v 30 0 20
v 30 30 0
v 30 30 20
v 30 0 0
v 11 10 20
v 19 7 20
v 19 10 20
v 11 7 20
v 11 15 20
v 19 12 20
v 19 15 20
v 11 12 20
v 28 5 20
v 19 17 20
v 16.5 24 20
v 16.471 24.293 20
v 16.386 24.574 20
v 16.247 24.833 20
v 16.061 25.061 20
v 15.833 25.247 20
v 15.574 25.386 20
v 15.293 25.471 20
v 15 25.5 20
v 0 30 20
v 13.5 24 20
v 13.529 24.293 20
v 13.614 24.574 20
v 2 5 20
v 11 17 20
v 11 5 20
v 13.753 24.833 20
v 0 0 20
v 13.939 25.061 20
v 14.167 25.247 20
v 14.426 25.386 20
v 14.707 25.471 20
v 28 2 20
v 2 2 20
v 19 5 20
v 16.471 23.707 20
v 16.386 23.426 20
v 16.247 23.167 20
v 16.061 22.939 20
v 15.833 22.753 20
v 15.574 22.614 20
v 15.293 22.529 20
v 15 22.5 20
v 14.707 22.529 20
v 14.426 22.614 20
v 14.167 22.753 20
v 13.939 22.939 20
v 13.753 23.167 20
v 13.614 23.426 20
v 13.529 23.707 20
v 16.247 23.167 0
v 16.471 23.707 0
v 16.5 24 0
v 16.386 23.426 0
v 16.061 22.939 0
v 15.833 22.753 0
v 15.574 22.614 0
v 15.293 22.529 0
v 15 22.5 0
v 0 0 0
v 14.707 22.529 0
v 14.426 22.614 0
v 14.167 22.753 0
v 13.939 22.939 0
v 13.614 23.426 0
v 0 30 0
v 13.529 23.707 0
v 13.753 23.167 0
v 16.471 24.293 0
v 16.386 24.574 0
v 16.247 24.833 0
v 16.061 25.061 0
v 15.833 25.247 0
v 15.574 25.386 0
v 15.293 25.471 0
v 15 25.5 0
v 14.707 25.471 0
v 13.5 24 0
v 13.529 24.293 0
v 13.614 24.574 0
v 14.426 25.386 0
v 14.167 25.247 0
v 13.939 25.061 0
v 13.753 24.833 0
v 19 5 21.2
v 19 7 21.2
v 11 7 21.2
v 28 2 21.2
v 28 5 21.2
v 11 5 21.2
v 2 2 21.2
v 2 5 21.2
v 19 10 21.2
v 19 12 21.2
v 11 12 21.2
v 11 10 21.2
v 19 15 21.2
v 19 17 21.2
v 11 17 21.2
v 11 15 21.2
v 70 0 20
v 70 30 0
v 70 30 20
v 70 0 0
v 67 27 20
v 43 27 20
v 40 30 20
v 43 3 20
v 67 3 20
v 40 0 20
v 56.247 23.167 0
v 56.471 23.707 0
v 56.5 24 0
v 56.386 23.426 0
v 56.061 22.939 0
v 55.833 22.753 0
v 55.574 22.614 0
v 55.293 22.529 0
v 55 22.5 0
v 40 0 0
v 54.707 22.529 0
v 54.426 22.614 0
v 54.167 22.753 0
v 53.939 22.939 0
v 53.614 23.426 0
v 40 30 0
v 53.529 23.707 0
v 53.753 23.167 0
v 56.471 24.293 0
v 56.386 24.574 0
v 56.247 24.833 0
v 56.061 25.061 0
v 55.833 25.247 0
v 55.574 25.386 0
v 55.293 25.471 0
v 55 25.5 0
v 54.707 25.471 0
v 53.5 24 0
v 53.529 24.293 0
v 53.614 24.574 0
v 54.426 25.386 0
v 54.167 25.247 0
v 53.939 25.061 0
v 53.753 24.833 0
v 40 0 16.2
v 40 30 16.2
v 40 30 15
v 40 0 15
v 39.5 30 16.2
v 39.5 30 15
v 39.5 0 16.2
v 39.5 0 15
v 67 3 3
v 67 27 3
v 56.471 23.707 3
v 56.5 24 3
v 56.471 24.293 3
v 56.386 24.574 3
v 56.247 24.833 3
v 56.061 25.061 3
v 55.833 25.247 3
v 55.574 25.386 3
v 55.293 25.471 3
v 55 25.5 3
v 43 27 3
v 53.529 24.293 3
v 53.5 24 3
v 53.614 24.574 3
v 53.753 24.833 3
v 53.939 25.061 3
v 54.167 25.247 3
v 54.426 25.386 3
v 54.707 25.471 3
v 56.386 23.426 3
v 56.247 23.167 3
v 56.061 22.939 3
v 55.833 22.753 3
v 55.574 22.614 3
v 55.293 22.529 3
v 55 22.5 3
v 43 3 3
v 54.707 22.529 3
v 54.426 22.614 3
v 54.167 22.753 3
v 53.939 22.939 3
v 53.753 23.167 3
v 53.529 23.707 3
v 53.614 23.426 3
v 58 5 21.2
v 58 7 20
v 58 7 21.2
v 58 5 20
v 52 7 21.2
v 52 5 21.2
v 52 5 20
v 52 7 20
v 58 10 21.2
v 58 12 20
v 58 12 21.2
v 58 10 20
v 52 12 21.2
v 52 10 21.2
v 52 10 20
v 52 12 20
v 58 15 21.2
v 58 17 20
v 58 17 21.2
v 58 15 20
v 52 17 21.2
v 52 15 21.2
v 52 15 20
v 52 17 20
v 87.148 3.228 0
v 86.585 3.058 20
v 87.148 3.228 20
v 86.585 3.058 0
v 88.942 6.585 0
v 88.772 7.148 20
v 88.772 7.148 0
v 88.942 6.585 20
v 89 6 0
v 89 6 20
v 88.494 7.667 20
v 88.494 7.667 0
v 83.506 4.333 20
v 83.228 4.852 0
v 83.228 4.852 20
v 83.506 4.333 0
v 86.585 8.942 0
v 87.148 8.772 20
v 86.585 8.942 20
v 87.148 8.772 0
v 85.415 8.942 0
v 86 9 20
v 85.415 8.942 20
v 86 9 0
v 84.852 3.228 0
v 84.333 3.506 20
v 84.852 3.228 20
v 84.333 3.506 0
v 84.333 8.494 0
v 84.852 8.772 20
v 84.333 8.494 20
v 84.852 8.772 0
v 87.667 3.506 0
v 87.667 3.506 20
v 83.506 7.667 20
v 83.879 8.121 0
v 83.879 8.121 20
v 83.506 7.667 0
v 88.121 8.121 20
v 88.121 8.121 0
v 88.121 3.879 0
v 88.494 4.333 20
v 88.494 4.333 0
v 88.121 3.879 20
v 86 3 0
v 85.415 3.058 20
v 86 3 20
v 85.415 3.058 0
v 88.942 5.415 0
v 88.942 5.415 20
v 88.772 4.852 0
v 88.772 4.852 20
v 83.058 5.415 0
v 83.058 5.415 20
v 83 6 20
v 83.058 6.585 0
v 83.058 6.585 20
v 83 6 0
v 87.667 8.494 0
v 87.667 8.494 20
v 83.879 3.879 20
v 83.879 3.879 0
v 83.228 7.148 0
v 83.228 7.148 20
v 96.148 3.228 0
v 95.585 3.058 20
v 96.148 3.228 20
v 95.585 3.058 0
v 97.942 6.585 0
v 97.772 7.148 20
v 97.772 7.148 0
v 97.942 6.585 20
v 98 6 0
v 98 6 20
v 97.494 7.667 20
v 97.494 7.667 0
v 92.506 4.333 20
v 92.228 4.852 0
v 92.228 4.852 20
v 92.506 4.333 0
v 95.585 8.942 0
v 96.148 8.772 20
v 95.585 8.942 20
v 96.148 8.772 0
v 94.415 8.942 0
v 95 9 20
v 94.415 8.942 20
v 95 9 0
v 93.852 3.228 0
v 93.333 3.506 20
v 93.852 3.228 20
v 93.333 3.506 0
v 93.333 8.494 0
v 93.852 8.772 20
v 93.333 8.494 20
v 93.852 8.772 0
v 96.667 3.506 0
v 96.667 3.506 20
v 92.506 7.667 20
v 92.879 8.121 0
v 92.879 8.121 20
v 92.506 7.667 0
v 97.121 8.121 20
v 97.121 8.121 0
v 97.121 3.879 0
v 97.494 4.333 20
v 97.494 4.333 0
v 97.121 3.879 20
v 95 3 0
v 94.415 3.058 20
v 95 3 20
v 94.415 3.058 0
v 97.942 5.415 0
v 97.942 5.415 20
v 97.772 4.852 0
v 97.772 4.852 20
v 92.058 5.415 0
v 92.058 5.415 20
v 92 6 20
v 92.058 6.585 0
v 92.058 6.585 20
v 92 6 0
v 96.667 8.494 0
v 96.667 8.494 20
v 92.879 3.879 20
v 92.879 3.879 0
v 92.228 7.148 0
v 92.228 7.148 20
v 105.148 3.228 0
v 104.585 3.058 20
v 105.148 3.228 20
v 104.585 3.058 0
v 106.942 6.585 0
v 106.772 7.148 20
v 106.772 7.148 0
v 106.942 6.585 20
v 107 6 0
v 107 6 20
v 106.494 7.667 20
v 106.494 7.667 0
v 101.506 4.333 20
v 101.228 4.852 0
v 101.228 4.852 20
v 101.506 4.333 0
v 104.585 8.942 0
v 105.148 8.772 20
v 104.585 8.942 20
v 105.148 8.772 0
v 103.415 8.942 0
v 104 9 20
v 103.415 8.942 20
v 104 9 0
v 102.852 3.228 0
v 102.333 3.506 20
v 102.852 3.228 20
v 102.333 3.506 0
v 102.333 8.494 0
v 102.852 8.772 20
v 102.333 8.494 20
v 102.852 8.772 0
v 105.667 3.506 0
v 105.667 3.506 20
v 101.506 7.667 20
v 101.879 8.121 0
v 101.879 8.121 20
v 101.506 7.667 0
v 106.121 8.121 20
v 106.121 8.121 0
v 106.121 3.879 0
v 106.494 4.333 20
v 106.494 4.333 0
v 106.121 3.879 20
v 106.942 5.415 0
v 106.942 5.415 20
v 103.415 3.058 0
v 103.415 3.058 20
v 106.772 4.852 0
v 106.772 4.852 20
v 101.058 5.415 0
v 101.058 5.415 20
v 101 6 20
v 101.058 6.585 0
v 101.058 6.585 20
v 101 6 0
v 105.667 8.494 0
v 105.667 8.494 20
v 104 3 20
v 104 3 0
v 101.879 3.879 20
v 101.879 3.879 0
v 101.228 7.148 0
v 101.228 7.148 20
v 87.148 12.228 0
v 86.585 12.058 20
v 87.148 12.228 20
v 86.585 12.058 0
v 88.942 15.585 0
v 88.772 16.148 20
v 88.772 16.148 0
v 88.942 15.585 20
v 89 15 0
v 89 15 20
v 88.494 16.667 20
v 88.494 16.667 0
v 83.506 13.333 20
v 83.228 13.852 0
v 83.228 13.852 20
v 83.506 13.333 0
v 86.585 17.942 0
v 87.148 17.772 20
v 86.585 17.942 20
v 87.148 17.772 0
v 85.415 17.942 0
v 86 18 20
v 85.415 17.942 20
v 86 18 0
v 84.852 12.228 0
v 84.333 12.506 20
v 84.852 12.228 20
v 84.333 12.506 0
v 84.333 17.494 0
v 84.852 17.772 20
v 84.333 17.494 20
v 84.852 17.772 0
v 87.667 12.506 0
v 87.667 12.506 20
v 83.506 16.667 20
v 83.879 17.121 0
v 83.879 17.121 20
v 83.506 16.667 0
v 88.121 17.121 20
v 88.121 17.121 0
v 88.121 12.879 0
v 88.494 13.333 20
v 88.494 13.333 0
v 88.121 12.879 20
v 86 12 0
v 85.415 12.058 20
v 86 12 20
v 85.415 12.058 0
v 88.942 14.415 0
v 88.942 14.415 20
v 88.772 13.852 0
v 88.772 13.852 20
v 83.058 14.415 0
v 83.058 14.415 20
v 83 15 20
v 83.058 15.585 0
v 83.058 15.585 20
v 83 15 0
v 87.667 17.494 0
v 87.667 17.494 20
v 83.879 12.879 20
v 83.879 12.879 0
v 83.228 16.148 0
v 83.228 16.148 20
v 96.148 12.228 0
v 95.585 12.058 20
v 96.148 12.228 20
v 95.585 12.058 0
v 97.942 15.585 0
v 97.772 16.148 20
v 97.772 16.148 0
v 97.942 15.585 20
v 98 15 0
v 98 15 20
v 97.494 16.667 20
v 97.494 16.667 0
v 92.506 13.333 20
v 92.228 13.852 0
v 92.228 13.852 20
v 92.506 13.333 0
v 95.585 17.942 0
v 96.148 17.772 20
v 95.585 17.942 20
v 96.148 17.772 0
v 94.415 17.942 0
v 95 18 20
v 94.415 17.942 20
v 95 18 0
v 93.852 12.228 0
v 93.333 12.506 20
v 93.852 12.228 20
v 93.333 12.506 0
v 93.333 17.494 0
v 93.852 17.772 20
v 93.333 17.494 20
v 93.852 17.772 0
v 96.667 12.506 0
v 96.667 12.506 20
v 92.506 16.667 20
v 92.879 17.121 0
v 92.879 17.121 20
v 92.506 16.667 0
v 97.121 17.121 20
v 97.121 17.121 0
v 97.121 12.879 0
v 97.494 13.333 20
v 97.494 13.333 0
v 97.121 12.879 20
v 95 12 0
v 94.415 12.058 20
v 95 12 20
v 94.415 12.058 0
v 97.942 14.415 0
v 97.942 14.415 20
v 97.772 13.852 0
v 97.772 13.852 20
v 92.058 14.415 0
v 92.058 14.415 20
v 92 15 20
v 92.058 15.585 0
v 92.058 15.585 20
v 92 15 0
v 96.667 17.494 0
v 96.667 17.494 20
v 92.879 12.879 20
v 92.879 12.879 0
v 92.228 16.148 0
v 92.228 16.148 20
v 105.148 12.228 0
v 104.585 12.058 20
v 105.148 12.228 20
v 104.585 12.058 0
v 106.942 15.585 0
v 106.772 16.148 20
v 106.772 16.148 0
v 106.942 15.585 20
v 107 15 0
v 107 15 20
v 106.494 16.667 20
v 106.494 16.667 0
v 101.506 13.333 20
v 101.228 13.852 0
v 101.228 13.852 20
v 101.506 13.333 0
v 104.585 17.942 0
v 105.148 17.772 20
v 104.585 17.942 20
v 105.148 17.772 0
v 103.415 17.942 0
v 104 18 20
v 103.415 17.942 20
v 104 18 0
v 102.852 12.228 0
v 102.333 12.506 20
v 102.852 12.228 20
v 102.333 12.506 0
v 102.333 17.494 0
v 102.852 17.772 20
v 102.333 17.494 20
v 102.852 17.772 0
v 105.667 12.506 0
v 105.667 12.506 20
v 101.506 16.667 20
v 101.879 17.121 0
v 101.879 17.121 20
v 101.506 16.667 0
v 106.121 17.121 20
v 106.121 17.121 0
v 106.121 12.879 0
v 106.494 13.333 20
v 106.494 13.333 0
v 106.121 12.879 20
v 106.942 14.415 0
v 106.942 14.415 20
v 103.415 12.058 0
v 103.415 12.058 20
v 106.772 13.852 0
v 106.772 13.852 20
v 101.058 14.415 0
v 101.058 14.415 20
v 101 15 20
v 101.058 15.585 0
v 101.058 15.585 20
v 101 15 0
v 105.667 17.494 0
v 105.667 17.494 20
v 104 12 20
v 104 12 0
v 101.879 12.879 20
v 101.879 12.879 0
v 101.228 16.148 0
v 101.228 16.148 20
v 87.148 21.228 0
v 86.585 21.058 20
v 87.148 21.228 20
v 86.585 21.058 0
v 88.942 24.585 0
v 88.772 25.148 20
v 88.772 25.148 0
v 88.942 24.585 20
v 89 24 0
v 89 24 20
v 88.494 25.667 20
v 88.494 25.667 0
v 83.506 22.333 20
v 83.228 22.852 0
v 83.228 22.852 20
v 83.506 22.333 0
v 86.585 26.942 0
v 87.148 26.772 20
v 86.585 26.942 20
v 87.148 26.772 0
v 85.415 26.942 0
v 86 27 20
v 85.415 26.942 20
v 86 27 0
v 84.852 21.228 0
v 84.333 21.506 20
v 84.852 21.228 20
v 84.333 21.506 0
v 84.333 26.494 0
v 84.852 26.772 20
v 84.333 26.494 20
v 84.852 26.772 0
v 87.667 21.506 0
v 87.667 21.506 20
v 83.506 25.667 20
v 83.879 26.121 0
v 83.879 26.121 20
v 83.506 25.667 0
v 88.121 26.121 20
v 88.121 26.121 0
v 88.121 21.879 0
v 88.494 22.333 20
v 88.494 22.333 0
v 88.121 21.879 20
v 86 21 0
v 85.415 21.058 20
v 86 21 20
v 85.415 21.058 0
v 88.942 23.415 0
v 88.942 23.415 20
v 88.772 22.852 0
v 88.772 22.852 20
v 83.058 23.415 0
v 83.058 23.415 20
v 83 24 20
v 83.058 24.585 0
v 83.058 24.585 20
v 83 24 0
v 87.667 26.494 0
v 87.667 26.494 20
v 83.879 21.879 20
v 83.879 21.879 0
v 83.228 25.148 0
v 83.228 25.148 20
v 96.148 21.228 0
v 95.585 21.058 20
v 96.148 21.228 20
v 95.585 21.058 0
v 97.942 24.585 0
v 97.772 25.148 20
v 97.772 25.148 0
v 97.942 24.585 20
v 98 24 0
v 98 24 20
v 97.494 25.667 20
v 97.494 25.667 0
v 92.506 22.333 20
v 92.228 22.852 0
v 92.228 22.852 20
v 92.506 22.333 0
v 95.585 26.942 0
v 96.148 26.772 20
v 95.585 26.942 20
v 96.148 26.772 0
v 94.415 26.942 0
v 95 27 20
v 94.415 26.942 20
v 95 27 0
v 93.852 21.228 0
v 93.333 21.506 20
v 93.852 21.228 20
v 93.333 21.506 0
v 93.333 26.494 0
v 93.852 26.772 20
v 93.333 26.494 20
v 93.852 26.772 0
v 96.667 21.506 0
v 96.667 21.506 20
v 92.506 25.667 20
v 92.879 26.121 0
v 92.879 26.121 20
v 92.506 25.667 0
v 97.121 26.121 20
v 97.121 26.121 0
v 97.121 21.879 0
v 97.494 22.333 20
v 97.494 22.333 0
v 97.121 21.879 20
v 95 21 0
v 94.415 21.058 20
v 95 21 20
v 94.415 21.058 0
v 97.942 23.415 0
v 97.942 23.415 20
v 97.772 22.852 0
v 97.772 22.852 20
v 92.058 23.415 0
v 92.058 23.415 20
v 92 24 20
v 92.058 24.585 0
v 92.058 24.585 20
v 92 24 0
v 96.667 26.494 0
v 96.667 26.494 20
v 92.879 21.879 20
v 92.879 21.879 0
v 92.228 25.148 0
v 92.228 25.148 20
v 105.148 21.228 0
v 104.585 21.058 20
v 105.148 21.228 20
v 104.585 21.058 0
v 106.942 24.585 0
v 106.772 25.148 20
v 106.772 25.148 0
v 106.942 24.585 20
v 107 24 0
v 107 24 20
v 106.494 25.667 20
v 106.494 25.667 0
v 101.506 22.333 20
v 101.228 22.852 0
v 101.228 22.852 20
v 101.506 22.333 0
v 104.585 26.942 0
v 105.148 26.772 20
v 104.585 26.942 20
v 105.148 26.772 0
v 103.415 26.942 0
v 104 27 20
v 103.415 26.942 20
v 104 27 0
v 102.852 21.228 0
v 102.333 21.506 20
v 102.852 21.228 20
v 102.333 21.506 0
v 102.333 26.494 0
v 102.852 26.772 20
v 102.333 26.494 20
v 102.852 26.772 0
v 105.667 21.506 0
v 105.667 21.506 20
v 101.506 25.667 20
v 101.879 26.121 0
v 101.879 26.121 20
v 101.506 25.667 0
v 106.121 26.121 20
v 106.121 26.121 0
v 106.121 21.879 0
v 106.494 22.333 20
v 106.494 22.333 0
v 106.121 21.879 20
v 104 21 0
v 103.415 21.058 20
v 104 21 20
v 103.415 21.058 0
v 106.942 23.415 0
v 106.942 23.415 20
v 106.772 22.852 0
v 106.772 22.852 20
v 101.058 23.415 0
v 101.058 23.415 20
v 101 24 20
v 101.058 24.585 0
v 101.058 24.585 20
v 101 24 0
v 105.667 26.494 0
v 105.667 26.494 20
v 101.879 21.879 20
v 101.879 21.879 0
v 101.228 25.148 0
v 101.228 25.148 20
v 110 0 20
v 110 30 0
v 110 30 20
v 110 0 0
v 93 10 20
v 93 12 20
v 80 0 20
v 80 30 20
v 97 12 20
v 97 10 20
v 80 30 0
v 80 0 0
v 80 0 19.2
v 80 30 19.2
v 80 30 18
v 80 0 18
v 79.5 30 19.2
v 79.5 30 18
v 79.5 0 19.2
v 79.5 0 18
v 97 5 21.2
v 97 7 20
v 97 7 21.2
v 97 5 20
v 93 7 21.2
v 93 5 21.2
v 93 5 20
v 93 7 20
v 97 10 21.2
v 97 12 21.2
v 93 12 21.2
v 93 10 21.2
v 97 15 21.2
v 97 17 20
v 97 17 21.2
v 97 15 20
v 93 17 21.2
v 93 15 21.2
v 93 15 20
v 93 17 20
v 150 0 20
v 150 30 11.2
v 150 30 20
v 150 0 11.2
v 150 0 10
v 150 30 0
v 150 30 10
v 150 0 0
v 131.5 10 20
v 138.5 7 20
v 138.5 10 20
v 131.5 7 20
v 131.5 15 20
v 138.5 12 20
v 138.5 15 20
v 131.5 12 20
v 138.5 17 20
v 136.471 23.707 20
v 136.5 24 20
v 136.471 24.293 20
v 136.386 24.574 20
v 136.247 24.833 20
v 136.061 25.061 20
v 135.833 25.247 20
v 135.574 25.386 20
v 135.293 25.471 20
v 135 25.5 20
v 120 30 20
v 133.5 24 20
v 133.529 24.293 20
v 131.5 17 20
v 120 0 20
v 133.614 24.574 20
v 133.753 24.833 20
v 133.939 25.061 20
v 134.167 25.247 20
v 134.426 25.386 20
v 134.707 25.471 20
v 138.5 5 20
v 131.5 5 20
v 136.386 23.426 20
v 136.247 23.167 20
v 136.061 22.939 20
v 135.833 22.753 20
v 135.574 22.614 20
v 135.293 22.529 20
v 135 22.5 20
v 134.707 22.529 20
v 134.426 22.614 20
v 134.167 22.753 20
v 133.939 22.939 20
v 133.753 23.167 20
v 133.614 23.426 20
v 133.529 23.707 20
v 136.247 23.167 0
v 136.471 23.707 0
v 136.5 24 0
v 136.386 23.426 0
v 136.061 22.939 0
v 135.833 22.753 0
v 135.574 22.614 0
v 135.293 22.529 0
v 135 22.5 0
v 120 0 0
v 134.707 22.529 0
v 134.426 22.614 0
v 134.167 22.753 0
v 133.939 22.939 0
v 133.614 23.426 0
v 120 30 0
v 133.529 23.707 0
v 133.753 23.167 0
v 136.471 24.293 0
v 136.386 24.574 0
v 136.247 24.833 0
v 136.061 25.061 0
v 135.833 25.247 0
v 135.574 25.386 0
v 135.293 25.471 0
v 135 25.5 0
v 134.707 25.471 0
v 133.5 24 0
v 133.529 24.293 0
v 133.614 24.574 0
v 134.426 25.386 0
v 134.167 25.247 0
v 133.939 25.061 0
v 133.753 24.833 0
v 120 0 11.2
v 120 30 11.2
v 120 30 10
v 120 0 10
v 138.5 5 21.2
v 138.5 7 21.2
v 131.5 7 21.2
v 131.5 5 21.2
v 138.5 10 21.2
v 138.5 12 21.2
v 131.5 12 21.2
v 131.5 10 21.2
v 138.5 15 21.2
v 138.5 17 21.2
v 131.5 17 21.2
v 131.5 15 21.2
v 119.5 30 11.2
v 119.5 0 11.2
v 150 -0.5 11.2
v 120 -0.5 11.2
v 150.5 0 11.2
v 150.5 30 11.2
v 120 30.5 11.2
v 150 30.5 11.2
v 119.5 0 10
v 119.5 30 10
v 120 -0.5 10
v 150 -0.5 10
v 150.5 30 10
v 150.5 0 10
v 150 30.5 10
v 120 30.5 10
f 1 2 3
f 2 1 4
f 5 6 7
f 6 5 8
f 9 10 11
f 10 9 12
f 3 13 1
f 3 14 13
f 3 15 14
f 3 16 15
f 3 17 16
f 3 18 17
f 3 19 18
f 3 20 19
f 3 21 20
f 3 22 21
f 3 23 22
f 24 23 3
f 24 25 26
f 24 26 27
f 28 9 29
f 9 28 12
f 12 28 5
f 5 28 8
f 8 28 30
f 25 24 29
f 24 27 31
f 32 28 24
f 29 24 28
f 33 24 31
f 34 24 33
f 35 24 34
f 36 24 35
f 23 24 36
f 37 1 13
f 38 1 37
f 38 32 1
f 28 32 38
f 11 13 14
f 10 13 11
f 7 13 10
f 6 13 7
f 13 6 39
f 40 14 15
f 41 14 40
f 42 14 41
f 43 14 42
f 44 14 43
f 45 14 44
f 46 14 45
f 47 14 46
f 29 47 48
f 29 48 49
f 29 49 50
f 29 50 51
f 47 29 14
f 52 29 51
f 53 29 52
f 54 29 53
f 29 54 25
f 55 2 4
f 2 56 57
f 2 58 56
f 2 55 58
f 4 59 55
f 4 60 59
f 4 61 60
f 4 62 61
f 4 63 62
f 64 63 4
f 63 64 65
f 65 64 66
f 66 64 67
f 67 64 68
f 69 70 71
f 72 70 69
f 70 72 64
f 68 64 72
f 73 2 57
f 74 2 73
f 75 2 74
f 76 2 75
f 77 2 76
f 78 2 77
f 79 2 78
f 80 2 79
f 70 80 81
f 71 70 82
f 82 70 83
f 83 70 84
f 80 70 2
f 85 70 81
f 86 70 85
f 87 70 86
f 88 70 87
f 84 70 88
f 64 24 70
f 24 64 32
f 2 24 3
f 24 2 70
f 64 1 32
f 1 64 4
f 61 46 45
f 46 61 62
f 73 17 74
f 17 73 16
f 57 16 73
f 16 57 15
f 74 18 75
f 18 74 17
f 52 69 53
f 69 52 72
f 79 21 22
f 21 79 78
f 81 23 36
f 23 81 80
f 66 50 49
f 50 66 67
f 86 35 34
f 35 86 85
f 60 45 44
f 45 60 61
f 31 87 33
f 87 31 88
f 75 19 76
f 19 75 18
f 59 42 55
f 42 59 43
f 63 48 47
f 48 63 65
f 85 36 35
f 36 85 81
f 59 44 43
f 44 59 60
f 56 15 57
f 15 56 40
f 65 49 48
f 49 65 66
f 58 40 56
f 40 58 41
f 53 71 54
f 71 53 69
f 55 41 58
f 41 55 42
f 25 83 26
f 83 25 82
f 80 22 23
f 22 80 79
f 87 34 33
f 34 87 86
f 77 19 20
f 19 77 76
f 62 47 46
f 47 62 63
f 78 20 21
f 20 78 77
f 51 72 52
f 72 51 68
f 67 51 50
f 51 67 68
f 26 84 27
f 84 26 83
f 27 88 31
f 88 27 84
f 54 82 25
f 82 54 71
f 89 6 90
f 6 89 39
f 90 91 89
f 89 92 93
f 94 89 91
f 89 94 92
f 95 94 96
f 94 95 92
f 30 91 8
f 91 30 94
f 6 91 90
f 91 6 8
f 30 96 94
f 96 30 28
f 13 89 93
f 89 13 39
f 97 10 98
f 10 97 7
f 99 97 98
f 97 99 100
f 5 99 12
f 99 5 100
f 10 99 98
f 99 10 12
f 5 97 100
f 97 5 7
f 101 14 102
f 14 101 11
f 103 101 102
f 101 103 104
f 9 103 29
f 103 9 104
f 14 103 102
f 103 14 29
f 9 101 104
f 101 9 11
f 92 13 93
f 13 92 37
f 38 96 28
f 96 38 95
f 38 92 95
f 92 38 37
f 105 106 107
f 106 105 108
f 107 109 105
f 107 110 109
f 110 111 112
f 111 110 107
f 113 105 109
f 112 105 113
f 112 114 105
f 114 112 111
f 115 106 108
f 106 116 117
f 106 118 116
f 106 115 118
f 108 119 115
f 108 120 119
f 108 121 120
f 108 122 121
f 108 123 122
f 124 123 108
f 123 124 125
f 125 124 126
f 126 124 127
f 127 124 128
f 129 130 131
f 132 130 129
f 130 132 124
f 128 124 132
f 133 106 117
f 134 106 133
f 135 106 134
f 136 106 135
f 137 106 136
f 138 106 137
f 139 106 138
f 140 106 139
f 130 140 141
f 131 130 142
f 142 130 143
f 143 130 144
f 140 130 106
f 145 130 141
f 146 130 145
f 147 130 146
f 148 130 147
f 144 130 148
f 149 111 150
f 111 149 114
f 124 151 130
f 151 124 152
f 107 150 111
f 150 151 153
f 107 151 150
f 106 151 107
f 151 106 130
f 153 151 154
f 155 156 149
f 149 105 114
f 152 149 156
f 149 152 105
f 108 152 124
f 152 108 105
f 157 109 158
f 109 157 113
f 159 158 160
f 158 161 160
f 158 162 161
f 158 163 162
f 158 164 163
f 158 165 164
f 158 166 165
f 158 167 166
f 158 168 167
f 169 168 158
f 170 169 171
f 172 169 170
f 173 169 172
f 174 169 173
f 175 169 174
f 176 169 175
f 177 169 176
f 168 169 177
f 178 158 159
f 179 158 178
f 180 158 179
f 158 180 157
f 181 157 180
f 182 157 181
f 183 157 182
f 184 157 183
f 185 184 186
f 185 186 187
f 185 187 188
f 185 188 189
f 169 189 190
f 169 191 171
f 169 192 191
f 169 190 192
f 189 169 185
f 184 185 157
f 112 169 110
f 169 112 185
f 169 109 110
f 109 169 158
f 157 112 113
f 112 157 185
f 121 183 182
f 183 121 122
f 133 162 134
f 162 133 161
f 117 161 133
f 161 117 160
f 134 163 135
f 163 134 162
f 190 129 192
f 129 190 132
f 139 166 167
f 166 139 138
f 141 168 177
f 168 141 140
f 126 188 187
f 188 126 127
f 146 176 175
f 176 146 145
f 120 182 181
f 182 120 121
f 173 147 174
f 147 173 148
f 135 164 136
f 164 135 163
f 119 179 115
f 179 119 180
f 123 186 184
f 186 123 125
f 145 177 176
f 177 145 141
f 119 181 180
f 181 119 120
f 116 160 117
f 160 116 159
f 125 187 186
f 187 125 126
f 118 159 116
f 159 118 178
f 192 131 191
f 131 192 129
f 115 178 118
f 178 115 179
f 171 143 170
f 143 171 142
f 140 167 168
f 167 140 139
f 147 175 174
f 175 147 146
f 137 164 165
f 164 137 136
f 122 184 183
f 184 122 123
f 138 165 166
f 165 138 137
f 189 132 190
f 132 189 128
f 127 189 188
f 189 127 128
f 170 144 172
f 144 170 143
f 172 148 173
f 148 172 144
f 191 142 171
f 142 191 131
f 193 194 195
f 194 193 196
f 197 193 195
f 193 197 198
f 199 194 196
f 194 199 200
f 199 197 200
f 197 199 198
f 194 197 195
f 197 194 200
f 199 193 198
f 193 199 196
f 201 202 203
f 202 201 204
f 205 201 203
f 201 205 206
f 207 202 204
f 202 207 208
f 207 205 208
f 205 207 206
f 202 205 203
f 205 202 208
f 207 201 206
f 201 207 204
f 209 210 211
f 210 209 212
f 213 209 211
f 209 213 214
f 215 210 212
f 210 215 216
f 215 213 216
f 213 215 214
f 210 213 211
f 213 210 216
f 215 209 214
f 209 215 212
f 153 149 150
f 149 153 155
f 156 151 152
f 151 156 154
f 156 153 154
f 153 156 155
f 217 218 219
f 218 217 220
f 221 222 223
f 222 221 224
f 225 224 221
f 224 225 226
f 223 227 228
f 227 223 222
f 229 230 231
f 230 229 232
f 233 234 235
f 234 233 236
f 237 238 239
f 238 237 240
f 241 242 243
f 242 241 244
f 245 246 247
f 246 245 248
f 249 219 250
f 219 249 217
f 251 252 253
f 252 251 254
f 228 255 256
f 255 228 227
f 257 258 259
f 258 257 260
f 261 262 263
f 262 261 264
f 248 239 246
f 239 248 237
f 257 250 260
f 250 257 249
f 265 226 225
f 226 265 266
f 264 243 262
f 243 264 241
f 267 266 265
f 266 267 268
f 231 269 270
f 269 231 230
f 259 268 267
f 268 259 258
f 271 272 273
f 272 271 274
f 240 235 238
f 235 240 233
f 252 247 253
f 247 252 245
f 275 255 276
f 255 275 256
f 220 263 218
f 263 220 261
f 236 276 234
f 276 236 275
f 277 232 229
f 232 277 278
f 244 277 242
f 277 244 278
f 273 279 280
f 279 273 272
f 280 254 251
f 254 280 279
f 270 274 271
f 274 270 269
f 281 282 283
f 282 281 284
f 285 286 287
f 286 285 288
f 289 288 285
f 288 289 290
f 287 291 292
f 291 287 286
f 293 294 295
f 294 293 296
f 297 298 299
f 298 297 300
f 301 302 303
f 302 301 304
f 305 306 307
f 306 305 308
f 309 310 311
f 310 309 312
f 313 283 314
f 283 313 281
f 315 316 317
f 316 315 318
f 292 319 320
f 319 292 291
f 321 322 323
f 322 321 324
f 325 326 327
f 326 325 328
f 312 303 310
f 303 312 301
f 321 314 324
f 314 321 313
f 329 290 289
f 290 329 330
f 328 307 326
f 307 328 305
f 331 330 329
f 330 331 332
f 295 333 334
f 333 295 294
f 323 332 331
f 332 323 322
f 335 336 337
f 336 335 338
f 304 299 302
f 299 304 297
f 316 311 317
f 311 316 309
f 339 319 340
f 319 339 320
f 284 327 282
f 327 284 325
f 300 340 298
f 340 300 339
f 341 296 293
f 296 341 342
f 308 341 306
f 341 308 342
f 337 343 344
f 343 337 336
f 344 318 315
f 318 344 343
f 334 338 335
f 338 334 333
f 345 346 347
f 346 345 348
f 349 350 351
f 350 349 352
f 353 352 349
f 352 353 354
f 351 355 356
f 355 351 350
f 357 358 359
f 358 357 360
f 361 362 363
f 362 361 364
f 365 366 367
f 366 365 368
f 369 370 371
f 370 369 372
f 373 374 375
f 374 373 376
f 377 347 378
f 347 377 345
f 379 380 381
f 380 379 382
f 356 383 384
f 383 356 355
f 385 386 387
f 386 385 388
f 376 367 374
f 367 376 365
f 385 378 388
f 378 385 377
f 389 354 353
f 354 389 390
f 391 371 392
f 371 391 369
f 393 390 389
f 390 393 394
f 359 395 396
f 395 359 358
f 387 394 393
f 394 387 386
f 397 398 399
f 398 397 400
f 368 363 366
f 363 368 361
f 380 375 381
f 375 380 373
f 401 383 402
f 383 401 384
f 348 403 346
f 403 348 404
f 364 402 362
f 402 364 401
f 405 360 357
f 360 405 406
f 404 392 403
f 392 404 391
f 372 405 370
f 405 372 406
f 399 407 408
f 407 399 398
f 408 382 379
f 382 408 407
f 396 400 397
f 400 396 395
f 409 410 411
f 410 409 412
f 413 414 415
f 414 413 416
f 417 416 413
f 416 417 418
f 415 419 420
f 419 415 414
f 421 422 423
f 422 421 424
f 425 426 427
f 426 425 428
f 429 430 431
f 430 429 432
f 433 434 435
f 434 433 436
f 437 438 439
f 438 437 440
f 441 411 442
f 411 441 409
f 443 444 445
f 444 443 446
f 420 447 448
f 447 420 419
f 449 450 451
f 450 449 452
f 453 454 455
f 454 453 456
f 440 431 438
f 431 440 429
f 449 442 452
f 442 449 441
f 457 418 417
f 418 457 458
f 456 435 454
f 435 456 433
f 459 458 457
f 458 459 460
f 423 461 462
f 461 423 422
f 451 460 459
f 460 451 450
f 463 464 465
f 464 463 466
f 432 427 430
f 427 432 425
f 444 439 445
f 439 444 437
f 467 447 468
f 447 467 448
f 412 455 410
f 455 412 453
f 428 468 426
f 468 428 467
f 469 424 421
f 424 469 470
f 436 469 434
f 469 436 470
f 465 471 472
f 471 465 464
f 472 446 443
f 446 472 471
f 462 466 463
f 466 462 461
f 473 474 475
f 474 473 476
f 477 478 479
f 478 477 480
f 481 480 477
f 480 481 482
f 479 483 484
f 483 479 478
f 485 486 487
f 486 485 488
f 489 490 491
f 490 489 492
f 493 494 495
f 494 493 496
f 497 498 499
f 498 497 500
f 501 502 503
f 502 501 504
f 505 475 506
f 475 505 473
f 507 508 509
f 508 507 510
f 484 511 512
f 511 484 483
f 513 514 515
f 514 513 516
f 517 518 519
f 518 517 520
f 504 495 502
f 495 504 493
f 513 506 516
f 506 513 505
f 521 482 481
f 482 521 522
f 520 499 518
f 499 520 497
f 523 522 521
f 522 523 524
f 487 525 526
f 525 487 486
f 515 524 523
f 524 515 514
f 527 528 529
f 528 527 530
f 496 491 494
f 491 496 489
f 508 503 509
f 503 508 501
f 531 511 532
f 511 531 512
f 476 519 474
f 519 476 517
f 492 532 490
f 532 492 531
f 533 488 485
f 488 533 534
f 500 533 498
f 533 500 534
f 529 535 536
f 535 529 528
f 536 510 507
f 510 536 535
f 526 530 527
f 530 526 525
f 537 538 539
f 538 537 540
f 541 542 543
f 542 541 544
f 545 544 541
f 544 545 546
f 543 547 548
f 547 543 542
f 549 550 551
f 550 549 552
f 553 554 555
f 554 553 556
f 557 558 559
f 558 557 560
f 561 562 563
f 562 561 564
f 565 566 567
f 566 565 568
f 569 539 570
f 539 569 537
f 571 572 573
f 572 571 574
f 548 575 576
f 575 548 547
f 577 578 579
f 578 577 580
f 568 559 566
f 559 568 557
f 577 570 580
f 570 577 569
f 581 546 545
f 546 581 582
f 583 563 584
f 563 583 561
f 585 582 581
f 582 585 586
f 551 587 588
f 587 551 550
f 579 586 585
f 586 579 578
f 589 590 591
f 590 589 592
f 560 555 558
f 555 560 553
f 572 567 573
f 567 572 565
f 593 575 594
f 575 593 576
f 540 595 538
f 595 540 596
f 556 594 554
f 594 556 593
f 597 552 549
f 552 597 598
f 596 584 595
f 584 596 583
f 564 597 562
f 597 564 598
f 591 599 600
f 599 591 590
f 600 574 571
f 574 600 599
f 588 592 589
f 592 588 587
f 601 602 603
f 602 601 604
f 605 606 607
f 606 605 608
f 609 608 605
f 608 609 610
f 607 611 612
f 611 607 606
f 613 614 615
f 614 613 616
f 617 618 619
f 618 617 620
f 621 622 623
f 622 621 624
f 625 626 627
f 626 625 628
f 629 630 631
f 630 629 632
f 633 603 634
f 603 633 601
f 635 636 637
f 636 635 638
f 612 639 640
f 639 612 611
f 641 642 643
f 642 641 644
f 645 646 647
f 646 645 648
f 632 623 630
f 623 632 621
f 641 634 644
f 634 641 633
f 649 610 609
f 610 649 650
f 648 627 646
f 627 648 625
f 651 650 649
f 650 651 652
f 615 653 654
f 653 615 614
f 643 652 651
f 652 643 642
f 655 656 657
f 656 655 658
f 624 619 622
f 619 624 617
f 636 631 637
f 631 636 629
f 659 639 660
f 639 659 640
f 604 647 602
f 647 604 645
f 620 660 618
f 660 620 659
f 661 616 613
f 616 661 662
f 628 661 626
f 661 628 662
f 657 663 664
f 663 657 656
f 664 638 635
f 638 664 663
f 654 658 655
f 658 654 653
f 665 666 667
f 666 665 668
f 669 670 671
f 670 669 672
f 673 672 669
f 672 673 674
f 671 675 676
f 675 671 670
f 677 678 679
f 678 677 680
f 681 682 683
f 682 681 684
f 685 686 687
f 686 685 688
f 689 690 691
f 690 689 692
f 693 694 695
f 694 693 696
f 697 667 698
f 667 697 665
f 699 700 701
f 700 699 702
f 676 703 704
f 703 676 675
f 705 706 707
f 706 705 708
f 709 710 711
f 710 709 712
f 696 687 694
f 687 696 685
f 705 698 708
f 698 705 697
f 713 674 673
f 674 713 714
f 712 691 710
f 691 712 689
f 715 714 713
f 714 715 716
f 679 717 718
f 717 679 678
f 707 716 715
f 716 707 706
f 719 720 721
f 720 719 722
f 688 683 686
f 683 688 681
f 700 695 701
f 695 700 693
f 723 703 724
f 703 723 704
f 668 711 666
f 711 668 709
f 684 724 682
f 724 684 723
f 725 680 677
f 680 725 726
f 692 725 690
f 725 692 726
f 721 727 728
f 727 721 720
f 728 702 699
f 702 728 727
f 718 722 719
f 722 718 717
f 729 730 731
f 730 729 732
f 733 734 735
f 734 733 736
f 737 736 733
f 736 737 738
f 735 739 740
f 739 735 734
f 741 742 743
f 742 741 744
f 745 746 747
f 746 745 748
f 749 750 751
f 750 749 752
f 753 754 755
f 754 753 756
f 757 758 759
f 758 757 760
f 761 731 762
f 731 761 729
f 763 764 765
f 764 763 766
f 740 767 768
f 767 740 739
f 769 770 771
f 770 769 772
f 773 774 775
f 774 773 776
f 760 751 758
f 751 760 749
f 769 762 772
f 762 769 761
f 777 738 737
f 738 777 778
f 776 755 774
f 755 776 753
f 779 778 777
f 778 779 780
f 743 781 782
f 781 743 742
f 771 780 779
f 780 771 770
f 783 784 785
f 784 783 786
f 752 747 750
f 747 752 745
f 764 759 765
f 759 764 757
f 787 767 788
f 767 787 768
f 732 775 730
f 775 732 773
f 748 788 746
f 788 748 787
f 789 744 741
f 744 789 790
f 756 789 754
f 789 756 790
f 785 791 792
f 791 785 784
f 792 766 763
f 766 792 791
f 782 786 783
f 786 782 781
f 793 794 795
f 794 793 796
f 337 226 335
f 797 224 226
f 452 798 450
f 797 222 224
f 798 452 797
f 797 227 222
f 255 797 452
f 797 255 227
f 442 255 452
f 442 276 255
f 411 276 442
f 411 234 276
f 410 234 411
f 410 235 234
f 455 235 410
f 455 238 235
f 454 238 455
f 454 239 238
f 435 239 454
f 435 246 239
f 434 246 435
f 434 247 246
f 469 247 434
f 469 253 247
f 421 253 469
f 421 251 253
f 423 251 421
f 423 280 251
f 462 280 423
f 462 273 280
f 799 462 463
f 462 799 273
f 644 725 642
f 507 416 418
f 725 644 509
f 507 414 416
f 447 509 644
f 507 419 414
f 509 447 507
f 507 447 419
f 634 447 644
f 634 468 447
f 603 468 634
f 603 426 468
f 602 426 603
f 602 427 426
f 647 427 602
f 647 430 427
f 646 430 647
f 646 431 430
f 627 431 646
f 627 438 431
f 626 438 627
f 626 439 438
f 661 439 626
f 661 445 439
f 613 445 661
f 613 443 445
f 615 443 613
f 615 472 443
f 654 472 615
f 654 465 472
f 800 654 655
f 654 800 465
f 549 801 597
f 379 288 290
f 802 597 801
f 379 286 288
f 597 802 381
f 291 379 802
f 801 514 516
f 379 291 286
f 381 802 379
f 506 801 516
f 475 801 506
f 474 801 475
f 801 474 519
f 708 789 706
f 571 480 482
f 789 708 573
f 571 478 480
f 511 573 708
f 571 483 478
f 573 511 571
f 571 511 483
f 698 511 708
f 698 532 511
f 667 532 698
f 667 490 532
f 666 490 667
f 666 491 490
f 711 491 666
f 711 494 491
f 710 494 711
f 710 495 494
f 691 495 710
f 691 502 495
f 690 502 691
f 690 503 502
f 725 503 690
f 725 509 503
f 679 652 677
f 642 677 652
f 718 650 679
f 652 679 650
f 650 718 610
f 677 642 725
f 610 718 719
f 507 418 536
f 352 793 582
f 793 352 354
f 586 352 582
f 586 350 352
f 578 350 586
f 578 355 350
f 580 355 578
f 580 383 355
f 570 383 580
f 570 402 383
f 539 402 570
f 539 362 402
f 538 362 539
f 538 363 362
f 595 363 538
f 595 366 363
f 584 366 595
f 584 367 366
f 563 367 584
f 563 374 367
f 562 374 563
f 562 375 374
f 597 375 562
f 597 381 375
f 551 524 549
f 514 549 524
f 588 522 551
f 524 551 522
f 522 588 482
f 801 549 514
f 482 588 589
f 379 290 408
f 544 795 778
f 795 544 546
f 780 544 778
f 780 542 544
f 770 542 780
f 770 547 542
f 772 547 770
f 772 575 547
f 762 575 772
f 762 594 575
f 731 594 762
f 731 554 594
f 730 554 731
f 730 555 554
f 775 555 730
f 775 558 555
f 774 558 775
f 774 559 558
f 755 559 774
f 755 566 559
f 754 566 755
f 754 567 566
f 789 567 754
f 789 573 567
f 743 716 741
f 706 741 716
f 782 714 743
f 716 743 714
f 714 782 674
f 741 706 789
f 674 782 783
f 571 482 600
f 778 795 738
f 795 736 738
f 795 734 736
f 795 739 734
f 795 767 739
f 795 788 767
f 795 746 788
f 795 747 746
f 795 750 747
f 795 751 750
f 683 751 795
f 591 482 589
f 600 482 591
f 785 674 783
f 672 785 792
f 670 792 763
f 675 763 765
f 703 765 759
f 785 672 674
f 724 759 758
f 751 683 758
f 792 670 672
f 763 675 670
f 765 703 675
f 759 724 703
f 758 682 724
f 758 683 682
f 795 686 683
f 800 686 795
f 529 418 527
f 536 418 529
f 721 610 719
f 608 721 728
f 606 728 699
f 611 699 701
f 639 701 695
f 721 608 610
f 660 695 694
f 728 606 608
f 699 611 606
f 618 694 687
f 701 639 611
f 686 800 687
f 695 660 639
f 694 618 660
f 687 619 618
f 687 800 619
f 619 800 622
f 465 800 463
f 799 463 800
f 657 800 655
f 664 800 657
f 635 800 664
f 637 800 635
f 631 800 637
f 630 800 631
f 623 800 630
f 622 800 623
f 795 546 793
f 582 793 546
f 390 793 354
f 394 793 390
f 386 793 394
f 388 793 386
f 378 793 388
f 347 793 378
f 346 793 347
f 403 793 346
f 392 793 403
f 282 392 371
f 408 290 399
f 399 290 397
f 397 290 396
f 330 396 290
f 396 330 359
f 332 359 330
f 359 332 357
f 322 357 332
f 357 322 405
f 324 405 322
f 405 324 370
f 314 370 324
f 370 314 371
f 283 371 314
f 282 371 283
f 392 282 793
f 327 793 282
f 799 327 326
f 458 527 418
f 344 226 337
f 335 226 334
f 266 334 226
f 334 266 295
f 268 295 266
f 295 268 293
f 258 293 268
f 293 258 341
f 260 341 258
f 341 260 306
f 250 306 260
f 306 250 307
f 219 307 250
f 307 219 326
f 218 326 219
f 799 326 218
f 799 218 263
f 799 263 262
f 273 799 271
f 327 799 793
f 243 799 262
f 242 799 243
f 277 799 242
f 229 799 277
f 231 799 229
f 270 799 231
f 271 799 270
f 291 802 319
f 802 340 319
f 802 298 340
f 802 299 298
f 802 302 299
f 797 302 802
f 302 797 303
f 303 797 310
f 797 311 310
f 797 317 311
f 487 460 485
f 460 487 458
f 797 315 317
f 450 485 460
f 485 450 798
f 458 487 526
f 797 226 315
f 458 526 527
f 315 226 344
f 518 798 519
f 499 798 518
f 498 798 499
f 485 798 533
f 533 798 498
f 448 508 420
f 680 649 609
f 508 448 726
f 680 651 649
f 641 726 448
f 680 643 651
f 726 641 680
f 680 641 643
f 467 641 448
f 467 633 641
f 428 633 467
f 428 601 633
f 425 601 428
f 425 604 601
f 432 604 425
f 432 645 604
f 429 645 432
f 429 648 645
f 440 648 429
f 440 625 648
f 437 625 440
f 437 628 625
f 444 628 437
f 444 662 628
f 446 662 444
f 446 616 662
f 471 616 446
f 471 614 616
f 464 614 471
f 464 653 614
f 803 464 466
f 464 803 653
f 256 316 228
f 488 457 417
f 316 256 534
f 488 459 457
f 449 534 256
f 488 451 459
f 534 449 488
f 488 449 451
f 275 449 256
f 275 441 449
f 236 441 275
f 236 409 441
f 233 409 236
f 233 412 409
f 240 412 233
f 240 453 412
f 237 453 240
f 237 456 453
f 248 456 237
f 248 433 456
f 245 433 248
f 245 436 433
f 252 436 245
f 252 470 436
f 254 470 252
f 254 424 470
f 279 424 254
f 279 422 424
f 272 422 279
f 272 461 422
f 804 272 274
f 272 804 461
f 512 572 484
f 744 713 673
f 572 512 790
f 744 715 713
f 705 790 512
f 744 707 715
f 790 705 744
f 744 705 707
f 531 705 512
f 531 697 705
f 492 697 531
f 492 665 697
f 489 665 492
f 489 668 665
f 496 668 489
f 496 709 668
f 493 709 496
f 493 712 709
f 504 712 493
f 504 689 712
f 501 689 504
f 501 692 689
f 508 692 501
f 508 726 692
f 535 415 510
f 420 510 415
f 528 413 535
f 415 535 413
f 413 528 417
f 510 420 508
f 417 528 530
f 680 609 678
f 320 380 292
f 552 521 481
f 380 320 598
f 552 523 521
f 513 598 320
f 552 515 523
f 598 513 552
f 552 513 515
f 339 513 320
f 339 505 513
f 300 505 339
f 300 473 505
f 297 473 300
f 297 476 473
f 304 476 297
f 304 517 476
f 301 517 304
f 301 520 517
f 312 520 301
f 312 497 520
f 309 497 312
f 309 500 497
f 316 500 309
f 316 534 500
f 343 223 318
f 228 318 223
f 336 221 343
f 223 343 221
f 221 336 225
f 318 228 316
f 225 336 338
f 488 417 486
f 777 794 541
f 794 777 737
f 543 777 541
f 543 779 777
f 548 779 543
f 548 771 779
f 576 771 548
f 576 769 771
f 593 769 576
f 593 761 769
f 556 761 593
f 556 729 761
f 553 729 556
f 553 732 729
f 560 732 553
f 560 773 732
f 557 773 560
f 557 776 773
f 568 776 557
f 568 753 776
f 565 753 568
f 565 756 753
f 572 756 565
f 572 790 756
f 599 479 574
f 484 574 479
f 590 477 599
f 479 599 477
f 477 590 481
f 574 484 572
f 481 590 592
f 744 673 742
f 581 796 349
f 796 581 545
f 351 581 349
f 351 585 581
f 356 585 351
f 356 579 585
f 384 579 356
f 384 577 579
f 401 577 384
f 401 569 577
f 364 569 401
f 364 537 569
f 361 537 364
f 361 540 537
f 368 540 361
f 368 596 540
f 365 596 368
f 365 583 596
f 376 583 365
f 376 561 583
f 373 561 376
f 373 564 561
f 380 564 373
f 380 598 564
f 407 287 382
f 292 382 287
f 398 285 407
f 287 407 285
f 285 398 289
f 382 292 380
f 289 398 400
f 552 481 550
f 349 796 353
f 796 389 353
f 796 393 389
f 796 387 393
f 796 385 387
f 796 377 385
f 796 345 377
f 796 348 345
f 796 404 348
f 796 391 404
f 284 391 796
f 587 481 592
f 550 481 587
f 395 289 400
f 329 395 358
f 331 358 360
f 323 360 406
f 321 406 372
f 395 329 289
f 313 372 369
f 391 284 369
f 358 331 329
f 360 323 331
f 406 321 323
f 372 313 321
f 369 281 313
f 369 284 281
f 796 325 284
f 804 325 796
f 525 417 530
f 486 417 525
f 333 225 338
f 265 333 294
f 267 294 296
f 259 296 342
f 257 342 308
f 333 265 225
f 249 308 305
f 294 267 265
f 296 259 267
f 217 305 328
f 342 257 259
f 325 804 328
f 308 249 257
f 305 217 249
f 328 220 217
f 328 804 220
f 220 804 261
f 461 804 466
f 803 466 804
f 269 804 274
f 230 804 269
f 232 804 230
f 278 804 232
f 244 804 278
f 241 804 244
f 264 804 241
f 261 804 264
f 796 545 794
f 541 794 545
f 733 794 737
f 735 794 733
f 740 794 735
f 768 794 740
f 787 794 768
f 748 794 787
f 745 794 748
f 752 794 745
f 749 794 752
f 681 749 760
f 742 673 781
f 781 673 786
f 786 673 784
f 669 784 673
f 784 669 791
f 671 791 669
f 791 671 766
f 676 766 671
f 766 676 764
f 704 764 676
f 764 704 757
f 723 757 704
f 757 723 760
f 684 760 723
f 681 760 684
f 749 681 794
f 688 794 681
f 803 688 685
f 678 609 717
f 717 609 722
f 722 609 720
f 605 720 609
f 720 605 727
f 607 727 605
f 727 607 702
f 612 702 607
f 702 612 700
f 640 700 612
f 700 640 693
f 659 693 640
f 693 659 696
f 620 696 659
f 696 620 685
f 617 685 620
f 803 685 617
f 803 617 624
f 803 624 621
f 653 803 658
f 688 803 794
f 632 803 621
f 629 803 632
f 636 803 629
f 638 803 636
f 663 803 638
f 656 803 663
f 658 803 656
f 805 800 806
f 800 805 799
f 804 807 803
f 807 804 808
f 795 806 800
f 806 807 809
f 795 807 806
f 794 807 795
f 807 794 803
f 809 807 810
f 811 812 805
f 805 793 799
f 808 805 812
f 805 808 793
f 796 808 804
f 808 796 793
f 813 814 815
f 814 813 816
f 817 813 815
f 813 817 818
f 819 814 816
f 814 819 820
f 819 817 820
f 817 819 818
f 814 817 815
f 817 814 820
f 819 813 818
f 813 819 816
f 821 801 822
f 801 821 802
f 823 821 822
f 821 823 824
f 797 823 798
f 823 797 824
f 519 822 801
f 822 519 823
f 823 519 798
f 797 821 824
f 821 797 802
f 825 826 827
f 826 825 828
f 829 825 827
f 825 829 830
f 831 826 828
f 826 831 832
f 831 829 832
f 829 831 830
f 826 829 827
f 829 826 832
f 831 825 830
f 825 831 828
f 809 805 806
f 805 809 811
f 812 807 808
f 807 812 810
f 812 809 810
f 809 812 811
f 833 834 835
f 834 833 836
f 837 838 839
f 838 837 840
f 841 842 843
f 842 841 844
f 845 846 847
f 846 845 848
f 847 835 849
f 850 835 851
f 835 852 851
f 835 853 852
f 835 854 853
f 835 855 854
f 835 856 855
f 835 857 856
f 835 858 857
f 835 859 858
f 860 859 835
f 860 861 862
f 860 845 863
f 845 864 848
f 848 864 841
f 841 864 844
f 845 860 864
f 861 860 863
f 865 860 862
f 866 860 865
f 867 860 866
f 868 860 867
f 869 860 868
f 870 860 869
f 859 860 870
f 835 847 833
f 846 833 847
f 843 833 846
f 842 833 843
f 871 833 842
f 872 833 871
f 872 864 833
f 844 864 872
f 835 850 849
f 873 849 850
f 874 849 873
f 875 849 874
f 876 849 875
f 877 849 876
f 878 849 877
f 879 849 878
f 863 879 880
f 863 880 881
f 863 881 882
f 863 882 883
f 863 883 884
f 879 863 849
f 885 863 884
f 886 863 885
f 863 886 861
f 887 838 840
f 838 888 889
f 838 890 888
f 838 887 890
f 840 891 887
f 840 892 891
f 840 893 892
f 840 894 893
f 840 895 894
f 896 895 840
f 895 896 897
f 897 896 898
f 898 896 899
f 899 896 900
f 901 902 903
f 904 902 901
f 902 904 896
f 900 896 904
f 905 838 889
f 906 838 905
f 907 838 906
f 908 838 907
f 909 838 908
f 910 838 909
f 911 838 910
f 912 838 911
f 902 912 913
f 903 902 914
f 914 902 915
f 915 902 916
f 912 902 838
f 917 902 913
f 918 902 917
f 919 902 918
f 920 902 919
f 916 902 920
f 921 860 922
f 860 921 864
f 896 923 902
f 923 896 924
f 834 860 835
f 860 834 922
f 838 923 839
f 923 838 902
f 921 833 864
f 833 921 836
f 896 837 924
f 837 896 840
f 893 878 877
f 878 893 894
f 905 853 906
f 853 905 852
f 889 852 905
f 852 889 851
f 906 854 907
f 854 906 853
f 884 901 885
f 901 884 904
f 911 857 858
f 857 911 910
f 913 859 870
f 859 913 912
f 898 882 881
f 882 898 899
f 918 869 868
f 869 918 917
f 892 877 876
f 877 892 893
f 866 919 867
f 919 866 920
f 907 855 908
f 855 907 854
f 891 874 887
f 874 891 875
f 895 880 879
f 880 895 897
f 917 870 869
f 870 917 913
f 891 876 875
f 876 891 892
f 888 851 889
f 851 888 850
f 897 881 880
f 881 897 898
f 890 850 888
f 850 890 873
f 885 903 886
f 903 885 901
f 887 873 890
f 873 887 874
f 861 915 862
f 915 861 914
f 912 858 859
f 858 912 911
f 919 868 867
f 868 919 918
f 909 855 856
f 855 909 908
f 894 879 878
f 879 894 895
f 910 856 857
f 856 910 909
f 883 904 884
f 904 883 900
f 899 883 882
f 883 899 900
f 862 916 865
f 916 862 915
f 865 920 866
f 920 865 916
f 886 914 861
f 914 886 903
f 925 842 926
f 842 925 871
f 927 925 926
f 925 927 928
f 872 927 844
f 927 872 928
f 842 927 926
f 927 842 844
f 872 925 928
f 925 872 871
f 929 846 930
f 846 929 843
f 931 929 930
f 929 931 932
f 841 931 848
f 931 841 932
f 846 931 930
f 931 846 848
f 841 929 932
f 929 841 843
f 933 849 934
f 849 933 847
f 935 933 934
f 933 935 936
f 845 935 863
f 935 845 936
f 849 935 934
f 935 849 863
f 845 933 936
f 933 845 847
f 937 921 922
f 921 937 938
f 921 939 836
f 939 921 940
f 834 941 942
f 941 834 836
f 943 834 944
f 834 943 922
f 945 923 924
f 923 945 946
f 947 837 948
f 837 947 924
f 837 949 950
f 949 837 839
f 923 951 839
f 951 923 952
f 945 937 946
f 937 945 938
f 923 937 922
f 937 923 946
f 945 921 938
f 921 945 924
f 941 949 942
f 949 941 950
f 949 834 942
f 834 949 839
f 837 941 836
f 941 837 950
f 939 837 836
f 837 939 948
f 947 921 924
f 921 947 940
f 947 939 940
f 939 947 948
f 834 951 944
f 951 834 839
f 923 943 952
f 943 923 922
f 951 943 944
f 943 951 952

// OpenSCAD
/*
 * Title: Buoyancy Comparison Block Set
 * Folder: 15_fluids_pressure
 * Physics Topic: Buoyancy, Archimedes' Principle, Density and Flotation
 * Difficulty: Beginner
 * Print Type: token/assembly
 * Teaches: F_buoy = ρ_fluid·V·g, density determines sink/float, displaced volume
 * Use Case: Weigh blocks in air and water; compare buoyancy forces; observe float/sink
 */

// --------------------
// Parameters
// --------------------
block_size           = 30;   // mm — cube side length (all blocks same outer size)
block_thickness      = 20;   // mm — depth of block (front-to-back)
show_density_label   = true;
hanging_hole_diameter = 3;   // mm — hole at top for string in water experiment
show_waterline_mark  = true; // raised line showing float waterline level

// --------------------
// Physics Meaning
// --------------------
// Archimedes' Principle: F_buoyancy = ρ_fluid · V_displaced · g
// All blocks have the same outer volume → same max buoyancy force if fully submerged.
// Whether a block floats depends on its AVERAGE DENSITY vs. fluid density.
// dense_block:    ρ_avg > ρ_water  → sinks
// hollow_block:   ρ_avg < ρ_water  → floats (large air volume reduces average density)
// foam_block:     ρ_avg << ρ_water → floats high (many air pockets)
// waterline_block: ρ_avg = ρ_water at a specific submersion depth

// --------------------
// Learning Notes
// --------------------
// - Use a spring scale: weight_in_air - weight_in_water = buoyancy force
// - The hollow and foam blocks displace the same water volume when submerged
//   as the solid block, but weigh less → net upward force → they float
// - The waterline mark shows the equilibrium submersion depth

// --------------------
// Print Notes
// --------------------
// - dense_block:    print at 80%+ infill in PLA (heavy)
// - hollow_block:   print at 0% infill, 2 perimeters (shell only)
// - foam_block:     print normally; cylindrical holes are part of geometry
// - waterline_block: print at ~50% infill
// - All blocks: orient with hole at top for clean bridging

// --------------------
// Customization Ideas
// --------------------
// - Change block_size to 40 mm for easier handling
// - Add more cutout rows to foam_block to reduce its density further
// - Adjust waterline_mark height to match a specific wood density (~0.6 g/cm³)

$fn = 32;

hole_y = block_size - hanging_hole_diameter - 3;  // y position of hanging hole
label_h = 1.2;   // raised label height
wall_t  = 3;     // hollow block shell wall thickness

// --------------------
// Hanging hole
// --------------------
module hanging_hole() {
  translate([block_size/2, hole_y, -1])
    cylinder(h=block_thickness + 2, d=hanging_hole_diameter);
}

// --------------------
// Waterline mark (raised ridge on side)
// --------------------
module waterline_mark(float_fraction=0.5) {
  // float_fraction: fraction of block submerged at equilibrium
  waterline_z = block_thickness * (1 - float_fraction);
  translate([-0.5, 0, waterline_z])
    cube([1.5, block_size, 1.2]);
}

// --------------------
// Label ridge (simple raised bar as label placeholder)
// --------------------
module side_label(label_index) {
  // Three small raised bars as a label identifier on the front face
  for (i = [0:2]) {
    w = (label_index == 0) ? 8 :
        (label_index == 1) ? 6 :
        (label_index == 2) ? 4 : 7;
    translate([block_size/2 - w/2, 5 + i*5, block_thickness])
      cube([w, 2, label_h]);
  }
}

// --------------------
// dense_block() — solid, high infill, sinks
// --------------------
module dense_block() {
  difference() {
    cube([block_size, block_size, block_thickness]);
    hanging_hole();
  }
  if (show_density_label) side_label(0);
  // "Dense" indicator: wide raised band
  translate([2, 2, block_thickness])
    cube([block_size - 4, 3, label_h]);
}

// --------------------
// hollow_block() — shell only, floats
// --------------------
module hollow_block() {
  difference() {
    cube([block_size, block_size, block_thickness]);
    // Large internal cavity
    translate([wall_t, wall_t, wall_t])
      cube([block_size - 2*wall_t, block_size - 2*wall_t, block_thickness - wall_t + 1]);
    hanging_hole();
  }
  if (show_density_label) side_label(1);
  if (show_waterline_mark) waterline_mark(0.25);  // floats 25% submerged
}

// --------------------
// foam_block() — grid of cylindrical cutouts, very low average density
// --------------------
module foam_block() {
  hole_d      = 6;    // mm — cutout cylinder diameter
  hole_rows   = 3;
  hole_cols   = 3;
  hole_margin = (block_size - hole_cols * hole_d) / (hole_cols + 1);

  difference() {
    cube([block_size, block_size, block_thickness]);
    // Grid of vertical cylindrical cutouts
    for (row = [0 : hole_rows - 1]) {
      for (col = [0 : hole_cols - 1]) {
        cx = hole_margin + col * (hole_d + hole_margin) + hole_d/2;
        cy = hole_margin + row * (hole_d + hole_margin) + hole_d/2;
        translate([cx, cy, -1])
          cylinder(h=block_thickness + 2, d=hole_d);
      }
    }
    hanging_hole();
  }
  if (show_density_label) side_label(2);
  if (show_waterline_mark) waterline_mark(0.1);  // floats very high
}

// --------------------
// waterline_block() — shows equilibrium float level explicitly
// --------------------
module waterline_block() {
  float_frac = 0.5;  // floats half submerged
  difference() {
    cube([block_size, block_size, block_thickness]);
    hanging_hole();
  }
  if (show_density_label) side_label(3);
  if (show_waterline_mark) {
    // Raised waterline ridge on all four vertical faces
    waterline_mark(float_frac);
    translate([block_size - 1, 0, block_thickness * (1 - float_frac)])
      cube([1.5, block_size, 1.2]);
    translate([0, -0.5, block_thickness * (1 - float_frac)])
      cube([block_size, 1.5, 1.2]);
    translate([0, block_size - 1, block_thickness * (1 - float_frac)])
      cube([block_size, 1.5, 1.2]);
  }
}

// --------------------
// demo_block_set() — all four blocks side by side
// --------------------
module demo_block_set() {
  spacing = block_size + 10;
  dense_block();
  translate([spacing, 0, 0])   hollow_block();
  translate([spacing*2, 0, 0]) foam_block();
  translate([spacing*3, 0, 0]) waterline_block();
}

// --------------------
// demo_default()
// --------------------
module demo_default() {
  demo_block_set();
}

// Run default demo
demo_default();
